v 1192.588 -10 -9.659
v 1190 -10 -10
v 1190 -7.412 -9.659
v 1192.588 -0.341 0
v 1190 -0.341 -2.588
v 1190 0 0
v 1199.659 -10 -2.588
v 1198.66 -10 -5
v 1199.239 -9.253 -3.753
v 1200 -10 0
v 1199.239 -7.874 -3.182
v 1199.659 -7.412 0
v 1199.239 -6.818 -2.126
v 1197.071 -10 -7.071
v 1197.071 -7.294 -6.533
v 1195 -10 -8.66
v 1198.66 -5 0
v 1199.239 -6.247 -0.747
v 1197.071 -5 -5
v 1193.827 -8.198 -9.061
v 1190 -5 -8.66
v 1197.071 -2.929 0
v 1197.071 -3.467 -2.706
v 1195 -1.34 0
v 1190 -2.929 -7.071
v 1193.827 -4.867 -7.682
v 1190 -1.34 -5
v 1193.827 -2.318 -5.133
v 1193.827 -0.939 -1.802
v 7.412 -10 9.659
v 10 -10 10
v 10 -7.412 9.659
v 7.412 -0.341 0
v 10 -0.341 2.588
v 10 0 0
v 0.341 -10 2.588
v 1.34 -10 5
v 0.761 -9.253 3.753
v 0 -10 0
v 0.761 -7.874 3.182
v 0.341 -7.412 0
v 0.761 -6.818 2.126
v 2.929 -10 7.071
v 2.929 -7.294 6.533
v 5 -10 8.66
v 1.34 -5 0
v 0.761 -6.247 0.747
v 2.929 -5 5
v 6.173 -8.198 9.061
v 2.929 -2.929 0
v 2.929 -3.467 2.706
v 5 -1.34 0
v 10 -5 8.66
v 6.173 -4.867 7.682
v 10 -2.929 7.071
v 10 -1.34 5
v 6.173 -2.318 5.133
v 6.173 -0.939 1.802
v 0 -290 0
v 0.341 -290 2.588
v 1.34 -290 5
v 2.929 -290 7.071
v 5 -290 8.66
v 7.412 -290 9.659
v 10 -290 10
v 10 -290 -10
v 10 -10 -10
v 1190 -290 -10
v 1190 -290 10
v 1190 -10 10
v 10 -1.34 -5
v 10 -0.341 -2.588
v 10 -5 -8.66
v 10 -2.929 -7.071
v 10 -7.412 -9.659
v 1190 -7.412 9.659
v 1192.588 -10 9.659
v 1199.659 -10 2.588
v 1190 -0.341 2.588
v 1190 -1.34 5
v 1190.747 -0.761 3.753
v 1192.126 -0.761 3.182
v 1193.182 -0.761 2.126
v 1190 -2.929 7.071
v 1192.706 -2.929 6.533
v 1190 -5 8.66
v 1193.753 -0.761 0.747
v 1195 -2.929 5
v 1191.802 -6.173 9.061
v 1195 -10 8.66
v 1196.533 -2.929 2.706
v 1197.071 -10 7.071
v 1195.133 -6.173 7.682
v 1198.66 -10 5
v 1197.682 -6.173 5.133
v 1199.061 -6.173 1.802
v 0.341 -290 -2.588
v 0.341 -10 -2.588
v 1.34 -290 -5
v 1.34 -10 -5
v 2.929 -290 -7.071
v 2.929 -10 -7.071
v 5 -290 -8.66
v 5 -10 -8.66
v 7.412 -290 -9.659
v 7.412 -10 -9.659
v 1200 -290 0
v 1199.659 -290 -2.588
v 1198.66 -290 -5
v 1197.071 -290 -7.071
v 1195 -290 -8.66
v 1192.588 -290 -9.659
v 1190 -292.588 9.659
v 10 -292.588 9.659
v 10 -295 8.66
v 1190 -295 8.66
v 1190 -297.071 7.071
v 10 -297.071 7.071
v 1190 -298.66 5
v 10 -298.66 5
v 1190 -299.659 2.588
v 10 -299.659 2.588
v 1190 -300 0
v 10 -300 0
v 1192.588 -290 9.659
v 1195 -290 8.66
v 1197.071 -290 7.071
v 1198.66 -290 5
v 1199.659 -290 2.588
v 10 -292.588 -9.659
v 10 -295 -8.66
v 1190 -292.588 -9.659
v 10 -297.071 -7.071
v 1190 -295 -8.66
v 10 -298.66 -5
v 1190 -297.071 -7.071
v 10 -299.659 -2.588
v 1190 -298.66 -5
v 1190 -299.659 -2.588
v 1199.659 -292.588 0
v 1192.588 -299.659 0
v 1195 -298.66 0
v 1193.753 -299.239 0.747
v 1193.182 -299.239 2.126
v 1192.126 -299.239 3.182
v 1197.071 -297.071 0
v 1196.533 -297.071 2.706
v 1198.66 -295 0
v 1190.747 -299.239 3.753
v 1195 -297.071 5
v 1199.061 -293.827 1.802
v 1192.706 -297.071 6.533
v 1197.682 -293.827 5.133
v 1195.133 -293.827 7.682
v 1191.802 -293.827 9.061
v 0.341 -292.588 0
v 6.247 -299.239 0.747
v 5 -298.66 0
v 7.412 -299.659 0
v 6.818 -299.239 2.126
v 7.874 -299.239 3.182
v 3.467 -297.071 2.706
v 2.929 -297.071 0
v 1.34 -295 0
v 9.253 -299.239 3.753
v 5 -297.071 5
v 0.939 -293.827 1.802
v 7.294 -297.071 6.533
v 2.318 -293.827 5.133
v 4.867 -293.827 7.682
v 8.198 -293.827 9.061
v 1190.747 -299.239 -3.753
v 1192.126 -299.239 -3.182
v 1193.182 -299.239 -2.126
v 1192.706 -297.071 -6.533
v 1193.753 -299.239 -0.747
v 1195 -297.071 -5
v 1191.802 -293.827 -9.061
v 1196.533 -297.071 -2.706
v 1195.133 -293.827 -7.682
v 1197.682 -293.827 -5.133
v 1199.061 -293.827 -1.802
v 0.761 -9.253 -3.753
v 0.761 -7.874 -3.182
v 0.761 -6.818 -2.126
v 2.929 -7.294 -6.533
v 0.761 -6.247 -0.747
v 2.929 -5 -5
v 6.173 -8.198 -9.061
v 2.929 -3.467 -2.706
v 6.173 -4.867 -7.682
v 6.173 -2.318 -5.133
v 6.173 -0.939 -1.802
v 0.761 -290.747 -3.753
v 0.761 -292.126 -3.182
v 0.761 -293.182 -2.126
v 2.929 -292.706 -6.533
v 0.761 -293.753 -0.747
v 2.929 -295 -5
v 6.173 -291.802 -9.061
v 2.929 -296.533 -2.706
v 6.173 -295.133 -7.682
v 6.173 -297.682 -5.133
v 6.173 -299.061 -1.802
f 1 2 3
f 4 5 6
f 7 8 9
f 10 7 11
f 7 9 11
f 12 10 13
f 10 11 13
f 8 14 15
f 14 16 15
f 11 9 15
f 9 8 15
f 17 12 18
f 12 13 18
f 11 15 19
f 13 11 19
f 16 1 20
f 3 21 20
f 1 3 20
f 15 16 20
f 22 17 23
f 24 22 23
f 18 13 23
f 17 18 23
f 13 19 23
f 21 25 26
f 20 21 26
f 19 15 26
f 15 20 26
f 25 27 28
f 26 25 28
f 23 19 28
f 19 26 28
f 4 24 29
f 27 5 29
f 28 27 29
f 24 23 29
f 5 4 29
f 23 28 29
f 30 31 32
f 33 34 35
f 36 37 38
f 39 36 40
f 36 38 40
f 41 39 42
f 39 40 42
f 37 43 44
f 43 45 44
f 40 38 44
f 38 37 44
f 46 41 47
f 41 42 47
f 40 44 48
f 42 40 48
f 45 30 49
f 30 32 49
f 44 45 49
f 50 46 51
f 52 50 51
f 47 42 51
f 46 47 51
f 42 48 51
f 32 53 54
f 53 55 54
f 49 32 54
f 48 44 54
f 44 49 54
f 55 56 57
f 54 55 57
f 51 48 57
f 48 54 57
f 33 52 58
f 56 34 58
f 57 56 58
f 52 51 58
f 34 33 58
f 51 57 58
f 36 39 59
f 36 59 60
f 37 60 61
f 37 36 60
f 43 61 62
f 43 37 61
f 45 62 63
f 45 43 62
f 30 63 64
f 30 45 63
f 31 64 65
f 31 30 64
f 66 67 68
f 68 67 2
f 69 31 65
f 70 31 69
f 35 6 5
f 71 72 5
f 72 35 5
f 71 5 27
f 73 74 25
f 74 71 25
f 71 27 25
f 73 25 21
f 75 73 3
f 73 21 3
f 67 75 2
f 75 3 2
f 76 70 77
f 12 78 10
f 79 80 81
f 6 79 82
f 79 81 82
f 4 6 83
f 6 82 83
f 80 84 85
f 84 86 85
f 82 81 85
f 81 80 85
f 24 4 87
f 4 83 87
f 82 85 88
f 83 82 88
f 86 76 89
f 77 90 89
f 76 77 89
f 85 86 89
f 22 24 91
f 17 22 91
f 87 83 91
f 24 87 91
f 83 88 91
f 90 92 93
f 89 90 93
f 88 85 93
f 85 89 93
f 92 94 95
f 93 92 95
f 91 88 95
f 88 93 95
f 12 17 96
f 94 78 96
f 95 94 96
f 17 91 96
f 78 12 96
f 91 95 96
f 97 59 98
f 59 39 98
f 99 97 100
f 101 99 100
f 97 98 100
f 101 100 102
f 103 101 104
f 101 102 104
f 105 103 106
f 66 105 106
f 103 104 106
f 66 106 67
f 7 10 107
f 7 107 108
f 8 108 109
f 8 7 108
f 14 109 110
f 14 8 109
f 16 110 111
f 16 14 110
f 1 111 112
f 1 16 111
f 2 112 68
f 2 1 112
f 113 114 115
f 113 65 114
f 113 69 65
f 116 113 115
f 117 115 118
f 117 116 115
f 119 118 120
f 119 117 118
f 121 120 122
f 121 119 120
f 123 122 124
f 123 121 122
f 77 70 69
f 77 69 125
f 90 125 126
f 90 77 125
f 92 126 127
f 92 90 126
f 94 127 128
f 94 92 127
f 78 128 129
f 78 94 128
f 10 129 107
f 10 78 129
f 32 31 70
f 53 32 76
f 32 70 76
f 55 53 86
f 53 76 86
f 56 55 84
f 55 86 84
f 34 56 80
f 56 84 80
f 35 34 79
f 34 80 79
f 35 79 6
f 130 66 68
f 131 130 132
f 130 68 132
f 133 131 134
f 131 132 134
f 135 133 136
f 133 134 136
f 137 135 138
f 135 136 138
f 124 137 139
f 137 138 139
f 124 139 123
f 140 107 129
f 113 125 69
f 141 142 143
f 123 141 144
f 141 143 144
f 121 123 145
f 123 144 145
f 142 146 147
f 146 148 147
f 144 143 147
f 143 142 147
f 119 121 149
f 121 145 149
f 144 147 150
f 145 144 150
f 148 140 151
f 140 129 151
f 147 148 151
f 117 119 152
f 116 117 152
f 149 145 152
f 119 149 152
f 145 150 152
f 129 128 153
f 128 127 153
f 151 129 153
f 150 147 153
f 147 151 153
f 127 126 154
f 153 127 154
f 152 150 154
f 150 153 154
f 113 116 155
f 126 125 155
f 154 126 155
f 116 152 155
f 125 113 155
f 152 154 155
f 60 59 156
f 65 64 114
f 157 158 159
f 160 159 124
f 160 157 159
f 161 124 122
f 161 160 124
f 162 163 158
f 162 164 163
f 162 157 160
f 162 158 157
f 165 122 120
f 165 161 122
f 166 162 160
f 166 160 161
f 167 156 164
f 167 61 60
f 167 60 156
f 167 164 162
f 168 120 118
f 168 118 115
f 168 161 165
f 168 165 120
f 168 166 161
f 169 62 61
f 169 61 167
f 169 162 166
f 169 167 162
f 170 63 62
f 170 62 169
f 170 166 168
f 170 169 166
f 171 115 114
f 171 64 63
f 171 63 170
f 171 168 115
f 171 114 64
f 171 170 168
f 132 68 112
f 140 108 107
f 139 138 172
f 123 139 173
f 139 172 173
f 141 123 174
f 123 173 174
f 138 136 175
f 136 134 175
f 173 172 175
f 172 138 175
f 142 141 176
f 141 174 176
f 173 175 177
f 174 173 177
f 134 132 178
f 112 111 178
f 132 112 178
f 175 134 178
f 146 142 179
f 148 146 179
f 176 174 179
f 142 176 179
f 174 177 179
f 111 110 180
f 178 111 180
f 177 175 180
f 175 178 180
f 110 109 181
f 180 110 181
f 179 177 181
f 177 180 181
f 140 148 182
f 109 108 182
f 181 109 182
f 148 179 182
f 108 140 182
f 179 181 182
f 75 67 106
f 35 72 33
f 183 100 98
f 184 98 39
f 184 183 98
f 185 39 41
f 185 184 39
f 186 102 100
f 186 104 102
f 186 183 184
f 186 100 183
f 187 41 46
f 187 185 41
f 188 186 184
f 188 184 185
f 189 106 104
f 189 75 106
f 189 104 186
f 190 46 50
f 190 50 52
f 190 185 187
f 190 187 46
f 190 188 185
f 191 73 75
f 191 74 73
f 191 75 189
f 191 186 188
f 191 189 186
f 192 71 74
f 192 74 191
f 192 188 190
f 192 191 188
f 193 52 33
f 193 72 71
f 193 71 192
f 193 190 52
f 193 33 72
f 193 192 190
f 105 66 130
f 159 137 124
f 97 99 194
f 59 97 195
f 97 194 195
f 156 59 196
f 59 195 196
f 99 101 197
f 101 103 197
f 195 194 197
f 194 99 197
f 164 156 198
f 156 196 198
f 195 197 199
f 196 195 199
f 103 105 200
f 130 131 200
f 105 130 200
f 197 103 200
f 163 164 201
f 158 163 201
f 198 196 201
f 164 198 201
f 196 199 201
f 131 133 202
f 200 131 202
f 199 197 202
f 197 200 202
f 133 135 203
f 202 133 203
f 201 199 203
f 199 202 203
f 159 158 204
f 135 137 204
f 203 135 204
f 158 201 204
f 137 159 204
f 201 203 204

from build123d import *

# Parameters (mm, degrees)
SKETCH1_W           = 1200
SKETCH1_H           = 300
BOSS_EXTRUDE1_DEPTH = 10
FILLET1_R           = 10


with BuildPart() as part:
    # Sketch1 → Boss-Extrude1 (new, symmetric)
    with BuildSketch(Plane.XY):
        with Locations((600, -150)):
            Rectangle(SKETCH1_W, SKETCH1_H)
    extrude(amount=BOSS_EXTRUDE1_DEPTH, both=True)

    # Fillet1
    fillet1_edges = [part.edges().sort_by_distance(p)[0] for p in [
        (1200, -150, 10),
        (600, 0, 10),
        (0, -150, 10),
        (600, 0, -10),
        (1200, -150, -10),
        (600, -300, -10),
        (0, -150, -10),
        (0, 0, 0),
        (1200, 0, 0),
        (1200, -300, 0),
        (0, -300, 0),
        (600, -300, 10),
    ]]
    fillet(fillet1_edges, radius=FILLET1_R - 0.0001)  # a hair under: the kernel refuses the full size


solid = part.part
